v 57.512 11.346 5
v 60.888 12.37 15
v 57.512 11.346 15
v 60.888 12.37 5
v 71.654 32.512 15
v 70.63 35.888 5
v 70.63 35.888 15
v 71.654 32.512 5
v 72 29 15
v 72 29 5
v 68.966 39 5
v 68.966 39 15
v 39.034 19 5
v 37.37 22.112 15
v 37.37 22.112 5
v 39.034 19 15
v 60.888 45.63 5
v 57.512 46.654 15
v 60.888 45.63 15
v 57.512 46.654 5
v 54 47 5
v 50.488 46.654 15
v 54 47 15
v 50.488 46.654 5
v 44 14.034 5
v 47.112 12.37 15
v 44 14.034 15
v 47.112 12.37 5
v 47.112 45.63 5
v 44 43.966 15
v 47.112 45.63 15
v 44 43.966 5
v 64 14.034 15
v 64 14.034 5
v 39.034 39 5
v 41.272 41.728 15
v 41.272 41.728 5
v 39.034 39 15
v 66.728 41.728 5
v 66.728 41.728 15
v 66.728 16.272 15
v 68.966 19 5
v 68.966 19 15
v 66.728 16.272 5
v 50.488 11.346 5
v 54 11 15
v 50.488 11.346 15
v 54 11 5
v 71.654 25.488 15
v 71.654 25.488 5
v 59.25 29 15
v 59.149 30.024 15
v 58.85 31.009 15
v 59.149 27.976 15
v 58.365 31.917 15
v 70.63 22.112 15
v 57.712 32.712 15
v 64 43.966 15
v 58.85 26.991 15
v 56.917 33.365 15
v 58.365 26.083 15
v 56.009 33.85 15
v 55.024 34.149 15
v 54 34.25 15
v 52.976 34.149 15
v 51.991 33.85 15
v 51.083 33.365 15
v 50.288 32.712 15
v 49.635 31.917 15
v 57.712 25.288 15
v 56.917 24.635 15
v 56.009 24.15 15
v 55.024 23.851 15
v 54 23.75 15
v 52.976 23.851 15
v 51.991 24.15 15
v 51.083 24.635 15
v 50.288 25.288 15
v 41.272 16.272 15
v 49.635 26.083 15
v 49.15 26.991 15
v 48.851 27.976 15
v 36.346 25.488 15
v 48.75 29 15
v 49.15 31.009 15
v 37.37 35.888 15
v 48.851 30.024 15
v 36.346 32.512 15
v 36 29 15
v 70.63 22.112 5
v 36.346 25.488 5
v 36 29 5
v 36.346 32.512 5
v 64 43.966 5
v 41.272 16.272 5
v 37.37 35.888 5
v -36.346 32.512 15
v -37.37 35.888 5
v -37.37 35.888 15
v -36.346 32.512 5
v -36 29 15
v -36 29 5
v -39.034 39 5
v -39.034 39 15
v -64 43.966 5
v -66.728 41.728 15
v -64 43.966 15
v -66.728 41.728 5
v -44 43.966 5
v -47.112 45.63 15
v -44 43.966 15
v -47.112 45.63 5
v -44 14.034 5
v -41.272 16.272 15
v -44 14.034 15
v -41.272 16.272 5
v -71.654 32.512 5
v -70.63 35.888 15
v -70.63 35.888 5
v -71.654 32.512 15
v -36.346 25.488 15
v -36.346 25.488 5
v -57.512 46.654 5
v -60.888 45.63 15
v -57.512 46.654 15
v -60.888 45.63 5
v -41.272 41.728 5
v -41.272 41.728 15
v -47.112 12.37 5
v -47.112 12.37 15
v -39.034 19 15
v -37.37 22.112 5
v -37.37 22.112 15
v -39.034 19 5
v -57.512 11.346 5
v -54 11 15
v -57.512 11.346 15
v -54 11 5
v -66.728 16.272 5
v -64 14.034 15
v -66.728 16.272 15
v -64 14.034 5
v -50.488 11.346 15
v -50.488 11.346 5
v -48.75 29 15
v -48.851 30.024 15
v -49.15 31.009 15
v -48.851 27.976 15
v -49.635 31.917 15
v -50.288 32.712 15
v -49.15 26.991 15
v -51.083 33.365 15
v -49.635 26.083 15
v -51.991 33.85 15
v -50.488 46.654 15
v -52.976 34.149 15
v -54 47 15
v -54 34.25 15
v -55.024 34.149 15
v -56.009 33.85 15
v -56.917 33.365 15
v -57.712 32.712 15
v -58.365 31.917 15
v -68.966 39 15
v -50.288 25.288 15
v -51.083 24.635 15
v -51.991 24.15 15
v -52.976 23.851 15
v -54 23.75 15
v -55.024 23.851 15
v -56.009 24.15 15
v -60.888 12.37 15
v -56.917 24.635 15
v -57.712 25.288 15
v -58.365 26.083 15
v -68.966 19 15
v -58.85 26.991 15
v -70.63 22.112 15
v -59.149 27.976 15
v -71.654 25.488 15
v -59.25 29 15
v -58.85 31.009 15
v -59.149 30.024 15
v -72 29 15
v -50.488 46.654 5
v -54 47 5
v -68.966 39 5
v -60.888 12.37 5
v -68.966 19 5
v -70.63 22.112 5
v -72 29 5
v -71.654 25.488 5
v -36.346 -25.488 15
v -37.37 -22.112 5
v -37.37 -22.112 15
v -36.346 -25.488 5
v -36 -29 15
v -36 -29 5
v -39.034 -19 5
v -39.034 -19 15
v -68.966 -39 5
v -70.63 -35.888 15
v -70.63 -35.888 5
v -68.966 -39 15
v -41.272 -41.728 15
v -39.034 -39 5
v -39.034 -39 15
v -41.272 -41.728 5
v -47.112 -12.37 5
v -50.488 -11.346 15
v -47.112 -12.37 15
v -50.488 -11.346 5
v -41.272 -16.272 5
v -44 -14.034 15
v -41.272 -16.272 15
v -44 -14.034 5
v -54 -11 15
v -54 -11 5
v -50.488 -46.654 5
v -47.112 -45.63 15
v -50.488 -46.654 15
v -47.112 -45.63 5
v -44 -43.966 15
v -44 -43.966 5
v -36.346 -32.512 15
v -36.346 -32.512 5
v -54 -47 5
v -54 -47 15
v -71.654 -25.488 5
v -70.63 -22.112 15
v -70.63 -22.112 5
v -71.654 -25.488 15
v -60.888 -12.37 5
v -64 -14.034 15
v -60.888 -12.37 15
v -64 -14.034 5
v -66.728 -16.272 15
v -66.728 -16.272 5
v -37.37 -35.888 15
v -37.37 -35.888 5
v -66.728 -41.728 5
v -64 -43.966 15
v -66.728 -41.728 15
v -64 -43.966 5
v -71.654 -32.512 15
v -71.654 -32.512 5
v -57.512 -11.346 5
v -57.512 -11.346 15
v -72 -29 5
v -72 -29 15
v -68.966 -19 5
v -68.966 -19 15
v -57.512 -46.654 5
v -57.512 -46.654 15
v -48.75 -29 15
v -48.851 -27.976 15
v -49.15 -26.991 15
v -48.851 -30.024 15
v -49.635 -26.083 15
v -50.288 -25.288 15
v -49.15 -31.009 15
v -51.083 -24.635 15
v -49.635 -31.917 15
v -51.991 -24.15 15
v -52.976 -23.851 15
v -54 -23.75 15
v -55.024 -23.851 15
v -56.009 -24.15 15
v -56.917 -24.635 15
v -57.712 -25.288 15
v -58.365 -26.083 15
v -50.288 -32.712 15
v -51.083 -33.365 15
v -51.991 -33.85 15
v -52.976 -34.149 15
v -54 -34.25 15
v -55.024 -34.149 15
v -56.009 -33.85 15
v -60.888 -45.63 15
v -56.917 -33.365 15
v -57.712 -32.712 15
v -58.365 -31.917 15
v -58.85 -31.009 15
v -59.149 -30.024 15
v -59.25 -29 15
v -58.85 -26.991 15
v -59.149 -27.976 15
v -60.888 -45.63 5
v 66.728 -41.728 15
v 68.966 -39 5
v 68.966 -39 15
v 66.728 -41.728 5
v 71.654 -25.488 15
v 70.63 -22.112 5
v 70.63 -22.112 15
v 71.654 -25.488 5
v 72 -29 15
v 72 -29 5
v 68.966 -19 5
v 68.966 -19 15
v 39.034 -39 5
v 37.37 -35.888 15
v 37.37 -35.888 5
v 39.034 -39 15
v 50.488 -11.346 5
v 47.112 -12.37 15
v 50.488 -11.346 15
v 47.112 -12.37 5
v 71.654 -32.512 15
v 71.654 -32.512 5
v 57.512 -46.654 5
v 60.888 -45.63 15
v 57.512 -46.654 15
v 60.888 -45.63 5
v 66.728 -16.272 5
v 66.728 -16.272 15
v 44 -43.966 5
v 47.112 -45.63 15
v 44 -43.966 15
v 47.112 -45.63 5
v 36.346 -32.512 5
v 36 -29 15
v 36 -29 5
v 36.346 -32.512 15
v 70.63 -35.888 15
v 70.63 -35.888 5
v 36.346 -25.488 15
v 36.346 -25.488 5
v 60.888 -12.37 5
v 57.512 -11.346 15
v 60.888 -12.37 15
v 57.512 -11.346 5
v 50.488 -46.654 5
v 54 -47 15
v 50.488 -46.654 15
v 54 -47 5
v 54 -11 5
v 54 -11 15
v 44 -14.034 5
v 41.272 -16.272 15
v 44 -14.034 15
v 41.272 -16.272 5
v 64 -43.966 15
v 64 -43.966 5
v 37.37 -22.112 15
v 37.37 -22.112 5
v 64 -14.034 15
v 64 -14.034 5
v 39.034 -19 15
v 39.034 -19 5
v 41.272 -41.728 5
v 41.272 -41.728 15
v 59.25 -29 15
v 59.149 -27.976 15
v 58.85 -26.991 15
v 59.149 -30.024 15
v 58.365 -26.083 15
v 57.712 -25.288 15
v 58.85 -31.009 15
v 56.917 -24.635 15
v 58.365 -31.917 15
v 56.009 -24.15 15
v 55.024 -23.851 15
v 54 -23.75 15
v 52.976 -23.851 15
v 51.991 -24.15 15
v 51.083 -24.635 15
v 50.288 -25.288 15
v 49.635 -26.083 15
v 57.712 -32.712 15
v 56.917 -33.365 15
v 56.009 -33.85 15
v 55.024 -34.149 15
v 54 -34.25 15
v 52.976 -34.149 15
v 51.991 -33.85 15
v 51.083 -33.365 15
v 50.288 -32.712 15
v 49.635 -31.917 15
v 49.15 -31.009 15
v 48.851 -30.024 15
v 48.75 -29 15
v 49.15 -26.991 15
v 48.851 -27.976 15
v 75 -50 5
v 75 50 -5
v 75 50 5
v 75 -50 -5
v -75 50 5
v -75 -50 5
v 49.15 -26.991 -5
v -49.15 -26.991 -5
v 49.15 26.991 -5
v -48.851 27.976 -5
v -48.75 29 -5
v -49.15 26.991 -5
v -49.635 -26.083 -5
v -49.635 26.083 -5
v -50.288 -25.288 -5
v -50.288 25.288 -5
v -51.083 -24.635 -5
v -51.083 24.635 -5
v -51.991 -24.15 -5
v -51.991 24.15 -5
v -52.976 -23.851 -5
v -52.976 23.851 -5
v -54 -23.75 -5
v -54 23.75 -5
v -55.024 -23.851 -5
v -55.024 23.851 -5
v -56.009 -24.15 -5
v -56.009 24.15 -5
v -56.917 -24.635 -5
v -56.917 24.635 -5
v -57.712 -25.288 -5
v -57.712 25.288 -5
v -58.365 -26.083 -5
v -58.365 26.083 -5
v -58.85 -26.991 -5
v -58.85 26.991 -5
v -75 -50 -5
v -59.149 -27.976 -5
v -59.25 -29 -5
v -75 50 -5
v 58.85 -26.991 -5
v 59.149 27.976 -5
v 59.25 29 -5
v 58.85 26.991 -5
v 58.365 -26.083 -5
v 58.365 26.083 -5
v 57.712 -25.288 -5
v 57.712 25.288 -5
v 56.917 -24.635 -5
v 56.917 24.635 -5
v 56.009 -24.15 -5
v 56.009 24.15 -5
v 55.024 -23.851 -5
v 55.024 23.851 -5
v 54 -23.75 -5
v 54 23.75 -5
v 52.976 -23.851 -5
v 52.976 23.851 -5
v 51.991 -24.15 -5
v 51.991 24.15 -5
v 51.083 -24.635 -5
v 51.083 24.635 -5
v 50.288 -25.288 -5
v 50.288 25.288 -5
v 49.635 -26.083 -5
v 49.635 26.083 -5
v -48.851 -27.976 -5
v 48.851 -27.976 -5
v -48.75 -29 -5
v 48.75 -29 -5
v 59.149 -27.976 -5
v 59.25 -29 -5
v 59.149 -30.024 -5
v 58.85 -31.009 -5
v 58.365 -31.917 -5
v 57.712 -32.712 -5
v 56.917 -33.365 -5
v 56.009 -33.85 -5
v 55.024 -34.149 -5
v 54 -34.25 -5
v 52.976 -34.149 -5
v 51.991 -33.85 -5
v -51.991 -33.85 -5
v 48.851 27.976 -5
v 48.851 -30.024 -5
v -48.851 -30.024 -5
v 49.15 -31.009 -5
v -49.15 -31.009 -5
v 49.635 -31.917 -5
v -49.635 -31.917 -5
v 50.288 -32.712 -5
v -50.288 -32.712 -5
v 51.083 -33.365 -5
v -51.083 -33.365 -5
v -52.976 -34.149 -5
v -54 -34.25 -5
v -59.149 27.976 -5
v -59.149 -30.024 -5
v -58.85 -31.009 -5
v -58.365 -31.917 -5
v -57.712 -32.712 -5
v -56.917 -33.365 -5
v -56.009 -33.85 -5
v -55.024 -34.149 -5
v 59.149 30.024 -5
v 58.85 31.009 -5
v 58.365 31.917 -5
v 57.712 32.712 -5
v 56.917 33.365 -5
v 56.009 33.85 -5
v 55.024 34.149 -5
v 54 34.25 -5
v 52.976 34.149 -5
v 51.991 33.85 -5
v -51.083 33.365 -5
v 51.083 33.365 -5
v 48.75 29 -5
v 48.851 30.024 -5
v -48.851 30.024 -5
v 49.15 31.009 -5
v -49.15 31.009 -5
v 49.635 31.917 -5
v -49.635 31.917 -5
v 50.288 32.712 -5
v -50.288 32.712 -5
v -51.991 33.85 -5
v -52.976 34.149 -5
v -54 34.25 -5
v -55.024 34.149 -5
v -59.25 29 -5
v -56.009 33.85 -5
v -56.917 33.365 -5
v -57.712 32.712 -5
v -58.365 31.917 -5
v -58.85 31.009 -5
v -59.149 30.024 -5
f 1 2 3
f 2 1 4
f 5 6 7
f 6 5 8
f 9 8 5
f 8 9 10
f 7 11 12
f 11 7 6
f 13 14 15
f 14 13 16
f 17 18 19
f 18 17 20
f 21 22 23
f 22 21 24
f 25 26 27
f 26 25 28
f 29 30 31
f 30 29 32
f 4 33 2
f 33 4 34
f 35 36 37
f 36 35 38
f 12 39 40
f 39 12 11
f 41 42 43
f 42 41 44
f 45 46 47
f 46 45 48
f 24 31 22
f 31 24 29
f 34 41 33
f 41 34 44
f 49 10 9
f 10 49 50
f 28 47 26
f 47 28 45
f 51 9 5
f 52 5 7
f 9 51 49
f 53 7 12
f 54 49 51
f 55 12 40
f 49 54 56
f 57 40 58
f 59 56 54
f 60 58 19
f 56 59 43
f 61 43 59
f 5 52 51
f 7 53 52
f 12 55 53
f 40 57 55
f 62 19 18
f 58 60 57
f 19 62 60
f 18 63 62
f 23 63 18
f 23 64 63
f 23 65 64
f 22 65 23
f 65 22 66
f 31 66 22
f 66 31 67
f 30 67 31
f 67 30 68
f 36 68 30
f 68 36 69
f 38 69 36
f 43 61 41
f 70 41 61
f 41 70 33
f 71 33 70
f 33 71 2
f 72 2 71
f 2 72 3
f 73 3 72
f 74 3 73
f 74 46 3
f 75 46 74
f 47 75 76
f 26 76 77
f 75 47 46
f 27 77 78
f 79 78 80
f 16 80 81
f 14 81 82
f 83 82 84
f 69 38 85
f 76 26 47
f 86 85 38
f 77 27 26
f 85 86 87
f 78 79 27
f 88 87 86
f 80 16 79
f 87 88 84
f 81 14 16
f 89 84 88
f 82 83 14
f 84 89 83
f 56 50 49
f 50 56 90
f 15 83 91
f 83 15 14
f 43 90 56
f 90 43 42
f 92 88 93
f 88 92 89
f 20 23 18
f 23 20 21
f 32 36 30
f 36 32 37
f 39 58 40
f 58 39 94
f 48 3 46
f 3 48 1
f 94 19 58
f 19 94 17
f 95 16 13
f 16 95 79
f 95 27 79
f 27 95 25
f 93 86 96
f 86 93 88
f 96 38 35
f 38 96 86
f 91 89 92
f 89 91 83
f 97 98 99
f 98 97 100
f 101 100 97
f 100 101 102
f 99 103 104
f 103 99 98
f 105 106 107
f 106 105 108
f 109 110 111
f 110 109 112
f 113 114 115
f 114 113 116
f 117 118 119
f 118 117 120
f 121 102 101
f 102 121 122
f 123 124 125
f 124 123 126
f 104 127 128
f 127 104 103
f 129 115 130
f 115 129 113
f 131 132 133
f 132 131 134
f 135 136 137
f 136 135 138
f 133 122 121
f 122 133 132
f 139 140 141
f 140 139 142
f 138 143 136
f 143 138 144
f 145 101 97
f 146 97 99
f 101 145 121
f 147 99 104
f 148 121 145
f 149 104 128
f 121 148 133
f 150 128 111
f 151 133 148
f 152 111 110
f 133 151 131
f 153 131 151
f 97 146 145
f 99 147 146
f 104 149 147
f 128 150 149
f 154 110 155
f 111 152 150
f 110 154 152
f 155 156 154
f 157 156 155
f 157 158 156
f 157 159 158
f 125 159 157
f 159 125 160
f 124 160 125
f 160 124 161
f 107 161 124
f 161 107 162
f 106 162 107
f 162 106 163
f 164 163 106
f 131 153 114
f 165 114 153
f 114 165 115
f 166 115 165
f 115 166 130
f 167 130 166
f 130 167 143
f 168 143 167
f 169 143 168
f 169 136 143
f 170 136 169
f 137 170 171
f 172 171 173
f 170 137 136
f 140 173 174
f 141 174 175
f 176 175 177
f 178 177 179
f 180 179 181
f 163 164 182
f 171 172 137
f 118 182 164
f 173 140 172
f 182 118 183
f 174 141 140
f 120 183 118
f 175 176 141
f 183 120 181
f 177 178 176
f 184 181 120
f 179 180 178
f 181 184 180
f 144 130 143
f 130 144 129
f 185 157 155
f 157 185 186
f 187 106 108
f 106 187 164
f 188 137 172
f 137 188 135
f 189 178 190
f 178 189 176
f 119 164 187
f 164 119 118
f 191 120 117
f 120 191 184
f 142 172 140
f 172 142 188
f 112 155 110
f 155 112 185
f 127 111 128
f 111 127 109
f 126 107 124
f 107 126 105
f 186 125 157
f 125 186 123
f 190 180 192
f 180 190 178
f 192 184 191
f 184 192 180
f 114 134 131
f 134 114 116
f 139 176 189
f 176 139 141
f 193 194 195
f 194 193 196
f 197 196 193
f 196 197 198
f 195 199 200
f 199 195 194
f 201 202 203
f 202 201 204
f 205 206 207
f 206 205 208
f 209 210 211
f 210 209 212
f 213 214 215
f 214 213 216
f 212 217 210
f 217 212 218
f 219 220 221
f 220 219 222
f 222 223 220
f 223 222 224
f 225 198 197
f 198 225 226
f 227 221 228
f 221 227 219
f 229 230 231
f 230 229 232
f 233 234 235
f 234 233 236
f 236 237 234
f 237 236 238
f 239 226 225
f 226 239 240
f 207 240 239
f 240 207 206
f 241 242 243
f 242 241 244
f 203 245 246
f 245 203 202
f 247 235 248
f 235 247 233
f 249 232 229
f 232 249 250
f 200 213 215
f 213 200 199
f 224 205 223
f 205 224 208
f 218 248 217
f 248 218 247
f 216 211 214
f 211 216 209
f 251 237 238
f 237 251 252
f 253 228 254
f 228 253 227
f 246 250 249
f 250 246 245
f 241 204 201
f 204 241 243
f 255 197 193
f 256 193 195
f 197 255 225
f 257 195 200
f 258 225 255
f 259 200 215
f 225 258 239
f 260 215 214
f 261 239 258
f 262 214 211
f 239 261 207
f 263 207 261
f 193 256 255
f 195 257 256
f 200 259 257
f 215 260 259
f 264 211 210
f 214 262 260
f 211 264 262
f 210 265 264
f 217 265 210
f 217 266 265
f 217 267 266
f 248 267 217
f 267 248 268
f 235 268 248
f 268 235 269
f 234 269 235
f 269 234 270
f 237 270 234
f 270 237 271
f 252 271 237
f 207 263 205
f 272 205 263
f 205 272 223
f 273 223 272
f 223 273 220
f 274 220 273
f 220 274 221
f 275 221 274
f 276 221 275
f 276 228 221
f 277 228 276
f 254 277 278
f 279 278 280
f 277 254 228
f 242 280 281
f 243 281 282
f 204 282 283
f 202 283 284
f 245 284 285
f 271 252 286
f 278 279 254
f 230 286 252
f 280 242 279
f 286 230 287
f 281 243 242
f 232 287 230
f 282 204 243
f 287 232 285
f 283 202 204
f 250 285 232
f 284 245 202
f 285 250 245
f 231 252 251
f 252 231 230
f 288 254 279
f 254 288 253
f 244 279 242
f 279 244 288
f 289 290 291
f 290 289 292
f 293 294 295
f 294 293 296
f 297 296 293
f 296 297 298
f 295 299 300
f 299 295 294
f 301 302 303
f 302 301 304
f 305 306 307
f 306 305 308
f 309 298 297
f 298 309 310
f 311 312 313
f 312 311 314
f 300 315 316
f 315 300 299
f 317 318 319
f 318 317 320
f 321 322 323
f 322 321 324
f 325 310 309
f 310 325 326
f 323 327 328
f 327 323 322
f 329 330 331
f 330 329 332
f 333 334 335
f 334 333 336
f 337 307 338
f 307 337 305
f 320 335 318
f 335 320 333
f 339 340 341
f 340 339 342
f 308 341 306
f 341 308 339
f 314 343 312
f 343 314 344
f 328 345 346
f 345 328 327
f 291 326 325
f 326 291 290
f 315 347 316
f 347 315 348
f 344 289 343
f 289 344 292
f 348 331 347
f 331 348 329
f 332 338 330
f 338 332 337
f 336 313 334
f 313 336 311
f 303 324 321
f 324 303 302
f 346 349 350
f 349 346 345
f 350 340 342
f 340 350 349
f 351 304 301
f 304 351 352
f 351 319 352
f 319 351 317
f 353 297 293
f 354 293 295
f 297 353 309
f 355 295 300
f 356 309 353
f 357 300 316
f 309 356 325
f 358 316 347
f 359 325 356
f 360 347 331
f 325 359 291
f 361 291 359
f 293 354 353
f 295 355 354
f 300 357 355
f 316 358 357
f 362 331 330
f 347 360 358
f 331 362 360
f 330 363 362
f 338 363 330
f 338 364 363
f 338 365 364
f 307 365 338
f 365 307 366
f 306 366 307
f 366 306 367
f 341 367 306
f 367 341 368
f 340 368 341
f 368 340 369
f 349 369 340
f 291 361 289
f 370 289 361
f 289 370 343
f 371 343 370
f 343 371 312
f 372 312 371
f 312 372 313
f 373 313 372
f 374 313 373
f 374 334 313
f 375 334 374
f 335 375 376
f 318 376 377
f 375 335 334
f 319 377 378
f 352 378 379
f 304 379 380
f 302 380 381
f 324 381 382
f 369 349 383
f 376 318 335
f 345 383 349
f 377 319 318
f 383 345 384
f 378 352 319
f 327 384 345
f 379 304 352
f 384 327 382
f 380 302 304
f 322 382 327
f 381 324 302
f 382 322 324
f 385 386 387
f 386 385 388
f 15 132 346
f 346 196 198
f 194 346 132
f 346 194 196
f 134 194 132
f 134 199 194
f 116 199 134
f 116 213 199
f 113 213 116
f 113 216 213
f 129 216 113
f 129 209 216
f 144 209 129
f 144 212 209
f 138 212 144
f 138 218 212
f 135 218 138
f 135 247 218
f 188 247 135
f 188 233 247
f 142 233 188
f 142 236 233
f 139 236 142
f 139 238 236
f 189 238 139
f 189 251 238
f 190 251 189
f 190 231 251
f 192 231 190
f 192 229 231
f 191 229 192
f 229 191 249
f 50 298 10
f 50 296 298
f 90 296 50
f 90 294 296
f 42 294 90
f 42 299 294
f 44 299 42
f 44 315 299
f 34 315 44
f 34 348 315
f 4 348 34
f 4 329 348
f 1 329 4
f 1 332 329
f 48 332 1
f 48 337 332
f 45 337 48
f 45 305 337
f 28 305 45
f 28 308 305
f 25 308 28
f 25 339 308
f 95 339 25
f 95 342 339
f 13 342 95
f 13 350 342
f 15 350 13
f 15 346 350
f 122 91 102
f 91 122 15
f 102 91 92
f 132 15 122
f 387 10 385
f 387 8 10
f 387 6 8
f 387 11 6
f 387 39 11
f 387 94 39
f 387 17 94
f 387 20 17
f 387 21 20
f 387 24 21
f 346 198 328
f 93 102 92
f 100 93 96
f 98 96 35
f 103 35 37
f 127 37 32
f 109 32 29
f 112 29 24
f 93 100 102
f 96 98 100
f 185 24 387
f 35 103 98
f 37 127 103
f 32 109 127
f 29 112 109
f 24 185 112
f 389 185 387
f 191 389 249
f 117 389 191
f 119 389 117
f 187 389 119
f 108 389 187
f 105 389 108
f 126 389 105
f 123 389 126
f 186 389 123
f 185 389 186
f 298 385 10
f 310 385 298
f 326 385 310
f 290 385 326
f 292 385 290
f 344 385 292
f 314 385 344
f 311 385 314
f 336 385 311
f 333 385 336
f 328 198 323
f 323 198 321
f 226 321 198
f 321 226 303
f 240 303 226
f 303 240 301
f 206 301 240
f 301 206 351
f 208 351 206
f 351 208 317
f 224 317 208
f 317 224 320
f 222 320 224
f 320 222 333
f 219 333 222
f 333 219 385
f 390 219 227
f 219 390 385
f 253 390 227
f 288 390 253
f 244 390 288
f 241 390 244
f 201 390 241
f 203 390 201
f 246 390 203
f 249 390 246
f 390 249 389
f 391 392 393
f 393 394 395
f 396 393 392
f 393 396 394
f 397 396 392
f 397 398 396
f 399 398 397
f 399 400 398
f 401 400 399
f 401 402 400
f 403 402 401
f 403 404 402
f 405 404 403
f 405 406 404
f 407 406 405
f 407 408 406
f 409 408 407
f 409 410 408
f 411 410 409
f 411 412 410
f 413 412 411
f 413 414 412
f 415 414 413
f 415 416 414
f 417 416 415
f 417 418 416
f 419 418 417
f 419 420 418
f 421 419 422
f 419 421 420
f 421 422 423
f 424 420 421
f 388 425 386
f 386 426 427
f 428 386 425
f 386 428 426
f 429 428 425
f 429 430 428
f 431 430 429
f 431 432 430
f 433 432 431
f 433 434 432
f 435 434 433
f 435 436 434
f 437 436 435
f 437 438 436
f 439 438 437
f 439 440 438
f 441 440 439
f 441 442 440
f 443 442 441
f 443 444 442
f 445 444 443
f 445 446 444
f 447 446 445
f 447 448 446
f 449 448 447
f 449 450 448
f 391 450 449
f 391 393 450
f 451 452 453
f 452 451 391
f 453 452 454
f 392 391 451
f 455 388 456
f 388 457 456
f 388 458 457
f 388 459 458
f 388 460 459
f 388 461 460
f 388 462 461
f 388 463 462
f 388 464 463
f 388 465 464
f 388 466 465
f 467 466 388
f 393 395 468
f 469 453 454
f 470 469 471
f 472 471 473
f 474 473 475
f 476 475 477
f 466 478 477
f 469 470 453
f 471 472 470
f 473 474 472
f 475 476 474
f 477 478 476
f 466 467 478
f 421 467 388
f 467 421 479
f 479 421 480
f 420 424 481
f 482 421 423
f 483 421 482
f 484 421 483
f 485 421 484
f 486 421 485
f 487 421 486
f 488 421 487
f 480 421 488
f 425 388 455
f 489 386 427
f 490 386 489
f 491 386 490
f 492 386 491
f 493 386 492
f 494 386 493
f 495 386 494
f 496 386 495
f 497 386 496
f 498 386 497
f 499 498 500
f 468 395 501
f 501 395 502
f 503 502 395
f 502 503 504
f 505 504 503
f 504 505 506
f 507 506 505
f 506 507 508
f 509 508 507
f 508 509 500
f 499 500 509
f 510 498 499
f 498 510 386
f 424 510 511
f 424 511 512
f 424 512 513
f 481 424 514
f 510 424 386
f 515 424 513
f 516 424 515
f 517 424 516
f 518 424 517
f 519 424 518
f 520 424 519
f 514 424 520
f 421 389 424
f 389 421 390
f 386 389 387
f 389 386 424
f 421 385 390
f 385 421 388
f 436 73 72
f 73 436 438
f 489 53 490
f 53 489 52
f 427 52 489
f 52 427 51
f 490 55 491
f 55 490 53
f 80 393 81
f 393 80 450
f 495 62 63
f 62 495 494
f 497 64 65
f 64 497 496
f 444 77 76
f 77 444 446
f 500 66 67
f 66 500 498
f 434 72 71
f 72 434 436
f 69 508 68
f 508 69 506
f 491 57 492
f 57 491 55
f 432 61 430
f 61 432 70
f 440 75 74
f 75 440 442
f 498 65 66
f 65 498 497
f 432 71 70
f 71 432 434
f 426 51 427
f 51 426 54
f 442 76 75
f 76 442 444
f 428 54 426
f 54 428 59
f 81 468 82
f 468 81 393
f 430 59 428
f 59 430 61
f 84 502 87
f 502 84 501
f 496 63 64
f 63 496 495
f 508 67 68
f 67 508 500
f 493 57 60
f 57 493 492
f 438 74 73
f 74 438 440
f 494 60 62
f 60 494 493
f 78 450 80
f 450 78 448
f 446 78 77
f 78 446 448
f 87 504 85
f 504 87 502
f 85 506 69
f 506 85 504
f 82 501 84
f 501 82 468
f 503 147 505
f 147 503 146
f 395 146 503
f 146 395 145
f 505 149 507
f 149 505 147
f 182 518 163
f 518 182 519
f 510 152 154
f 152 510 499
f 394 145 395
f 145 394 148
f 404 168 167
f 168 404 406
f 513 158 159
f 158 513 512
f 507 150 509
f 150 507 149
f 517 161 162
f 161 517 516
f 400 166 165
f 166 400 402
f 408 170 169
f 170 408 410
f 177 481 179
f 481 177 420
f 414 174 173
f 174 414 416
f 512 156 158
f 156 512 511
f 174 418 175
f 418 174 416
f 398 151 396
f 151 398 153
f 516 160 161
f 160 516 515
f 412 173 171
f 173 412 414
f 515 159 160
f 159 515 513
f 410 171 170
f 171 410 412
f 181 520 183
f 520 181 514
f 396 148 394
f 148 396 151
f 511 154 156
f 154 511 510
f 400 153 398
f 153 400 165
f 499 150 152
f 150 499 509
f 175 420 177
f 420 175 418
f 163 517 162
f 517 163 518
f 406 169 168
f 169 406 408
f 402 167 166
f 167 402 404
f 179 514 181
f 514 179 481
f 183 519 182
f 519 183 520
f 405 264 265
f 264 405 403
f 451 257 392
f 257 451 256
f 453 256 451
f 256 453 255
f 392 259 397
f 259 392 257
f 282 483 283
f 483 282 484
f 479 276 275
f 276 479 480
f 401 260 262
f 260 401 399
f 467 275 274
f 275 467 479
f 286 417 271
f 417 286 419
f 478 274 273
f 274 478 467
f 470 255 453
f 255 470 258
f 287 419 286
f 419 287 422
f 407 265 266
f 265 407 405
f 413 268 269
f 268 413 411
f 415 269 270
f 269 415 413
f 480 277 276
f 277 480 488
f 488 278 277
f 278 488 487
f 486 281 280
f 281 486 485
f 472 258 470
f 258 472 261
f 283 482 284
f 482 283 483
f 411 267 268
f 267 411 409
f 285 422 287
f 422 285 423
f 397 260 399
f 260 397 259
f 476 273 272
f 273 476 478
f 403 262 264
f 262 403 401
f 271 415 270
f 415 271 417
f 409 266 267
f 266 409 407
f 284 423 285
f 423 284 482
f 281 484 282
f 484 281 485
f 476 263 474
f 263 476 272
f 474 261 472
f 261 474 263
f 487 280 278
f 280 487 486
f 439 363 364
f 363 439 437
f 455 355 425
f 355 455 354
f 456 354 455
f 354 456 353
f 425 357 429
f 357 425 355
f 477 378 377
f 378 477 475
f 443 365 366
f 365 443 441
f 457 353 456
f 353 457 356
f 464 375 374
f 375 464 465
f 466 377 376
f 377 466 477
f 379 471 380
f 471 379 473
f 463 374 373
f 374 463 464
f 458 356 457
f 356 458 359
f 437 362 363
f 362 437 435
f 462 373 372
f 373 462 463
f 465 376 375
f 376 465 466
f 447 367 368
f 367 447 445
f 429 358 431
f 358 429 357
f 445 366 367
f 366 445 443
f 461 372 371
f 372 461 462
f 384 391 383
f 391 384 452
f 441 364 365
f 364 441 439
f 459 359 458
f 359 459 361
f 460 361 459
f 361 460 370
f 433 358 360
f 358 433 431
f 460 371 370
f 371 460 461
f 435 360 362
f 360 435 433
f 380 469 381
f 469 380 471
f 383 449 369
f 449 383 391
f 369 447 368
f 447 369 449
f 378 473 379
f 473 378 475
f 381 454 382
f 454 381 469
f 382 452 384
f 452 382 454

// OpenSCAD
$fn = 32;

// ----------------------------------------------------------------------
// Anchor pads 150 x 100 x 20
// four corner bosses with anchor holes
// ----------------------------------------------------------------------

// --- parameters (mm) ---
plate = [150, 100, 10];  // base plate size (x, y, z)
pads = 4;                // boss count, one per corner
edge = 21;               // boss centre offset from the plate edge
boss_d = 36;             // boss diameter
boss_h = 10;             // boss height above the base plate
hole_d = 10.5;           // hole diameter

// --- derived feature positions (mm) ---
height = plate[2] + boss_h;      // = 20   overall height of the part
corner_x = plate[0] / 2 - edge;  // = 54   boss centre X
corner_y = plate[1] / 2 - edge;  // = 29   boss centre Y
feature_centers = [
  [corner_x, corner_y],
  [-corner_x, corner_y],
  [-corner_x, -corner_y],
  [corner_x, -corner_y]
];   // boss centres, anchor holes are drilled there

// base plate, four bosses standing on it, anchor holes all the way through
difference() {
  union() {
    cube(plate, center = true);
    for (centre = feature_centers)
      translate([centre[0], centre[1], plate[2] / 2 - 1])
        cylinder(d = boss_d, h = boss_h + 1);
  }
  for (centre = feature_centers)
    translate([centre[0], centre[1], -height])
      cylinder(d = hole_d, h = 2 * height + 2);  // through boss and plate
}
